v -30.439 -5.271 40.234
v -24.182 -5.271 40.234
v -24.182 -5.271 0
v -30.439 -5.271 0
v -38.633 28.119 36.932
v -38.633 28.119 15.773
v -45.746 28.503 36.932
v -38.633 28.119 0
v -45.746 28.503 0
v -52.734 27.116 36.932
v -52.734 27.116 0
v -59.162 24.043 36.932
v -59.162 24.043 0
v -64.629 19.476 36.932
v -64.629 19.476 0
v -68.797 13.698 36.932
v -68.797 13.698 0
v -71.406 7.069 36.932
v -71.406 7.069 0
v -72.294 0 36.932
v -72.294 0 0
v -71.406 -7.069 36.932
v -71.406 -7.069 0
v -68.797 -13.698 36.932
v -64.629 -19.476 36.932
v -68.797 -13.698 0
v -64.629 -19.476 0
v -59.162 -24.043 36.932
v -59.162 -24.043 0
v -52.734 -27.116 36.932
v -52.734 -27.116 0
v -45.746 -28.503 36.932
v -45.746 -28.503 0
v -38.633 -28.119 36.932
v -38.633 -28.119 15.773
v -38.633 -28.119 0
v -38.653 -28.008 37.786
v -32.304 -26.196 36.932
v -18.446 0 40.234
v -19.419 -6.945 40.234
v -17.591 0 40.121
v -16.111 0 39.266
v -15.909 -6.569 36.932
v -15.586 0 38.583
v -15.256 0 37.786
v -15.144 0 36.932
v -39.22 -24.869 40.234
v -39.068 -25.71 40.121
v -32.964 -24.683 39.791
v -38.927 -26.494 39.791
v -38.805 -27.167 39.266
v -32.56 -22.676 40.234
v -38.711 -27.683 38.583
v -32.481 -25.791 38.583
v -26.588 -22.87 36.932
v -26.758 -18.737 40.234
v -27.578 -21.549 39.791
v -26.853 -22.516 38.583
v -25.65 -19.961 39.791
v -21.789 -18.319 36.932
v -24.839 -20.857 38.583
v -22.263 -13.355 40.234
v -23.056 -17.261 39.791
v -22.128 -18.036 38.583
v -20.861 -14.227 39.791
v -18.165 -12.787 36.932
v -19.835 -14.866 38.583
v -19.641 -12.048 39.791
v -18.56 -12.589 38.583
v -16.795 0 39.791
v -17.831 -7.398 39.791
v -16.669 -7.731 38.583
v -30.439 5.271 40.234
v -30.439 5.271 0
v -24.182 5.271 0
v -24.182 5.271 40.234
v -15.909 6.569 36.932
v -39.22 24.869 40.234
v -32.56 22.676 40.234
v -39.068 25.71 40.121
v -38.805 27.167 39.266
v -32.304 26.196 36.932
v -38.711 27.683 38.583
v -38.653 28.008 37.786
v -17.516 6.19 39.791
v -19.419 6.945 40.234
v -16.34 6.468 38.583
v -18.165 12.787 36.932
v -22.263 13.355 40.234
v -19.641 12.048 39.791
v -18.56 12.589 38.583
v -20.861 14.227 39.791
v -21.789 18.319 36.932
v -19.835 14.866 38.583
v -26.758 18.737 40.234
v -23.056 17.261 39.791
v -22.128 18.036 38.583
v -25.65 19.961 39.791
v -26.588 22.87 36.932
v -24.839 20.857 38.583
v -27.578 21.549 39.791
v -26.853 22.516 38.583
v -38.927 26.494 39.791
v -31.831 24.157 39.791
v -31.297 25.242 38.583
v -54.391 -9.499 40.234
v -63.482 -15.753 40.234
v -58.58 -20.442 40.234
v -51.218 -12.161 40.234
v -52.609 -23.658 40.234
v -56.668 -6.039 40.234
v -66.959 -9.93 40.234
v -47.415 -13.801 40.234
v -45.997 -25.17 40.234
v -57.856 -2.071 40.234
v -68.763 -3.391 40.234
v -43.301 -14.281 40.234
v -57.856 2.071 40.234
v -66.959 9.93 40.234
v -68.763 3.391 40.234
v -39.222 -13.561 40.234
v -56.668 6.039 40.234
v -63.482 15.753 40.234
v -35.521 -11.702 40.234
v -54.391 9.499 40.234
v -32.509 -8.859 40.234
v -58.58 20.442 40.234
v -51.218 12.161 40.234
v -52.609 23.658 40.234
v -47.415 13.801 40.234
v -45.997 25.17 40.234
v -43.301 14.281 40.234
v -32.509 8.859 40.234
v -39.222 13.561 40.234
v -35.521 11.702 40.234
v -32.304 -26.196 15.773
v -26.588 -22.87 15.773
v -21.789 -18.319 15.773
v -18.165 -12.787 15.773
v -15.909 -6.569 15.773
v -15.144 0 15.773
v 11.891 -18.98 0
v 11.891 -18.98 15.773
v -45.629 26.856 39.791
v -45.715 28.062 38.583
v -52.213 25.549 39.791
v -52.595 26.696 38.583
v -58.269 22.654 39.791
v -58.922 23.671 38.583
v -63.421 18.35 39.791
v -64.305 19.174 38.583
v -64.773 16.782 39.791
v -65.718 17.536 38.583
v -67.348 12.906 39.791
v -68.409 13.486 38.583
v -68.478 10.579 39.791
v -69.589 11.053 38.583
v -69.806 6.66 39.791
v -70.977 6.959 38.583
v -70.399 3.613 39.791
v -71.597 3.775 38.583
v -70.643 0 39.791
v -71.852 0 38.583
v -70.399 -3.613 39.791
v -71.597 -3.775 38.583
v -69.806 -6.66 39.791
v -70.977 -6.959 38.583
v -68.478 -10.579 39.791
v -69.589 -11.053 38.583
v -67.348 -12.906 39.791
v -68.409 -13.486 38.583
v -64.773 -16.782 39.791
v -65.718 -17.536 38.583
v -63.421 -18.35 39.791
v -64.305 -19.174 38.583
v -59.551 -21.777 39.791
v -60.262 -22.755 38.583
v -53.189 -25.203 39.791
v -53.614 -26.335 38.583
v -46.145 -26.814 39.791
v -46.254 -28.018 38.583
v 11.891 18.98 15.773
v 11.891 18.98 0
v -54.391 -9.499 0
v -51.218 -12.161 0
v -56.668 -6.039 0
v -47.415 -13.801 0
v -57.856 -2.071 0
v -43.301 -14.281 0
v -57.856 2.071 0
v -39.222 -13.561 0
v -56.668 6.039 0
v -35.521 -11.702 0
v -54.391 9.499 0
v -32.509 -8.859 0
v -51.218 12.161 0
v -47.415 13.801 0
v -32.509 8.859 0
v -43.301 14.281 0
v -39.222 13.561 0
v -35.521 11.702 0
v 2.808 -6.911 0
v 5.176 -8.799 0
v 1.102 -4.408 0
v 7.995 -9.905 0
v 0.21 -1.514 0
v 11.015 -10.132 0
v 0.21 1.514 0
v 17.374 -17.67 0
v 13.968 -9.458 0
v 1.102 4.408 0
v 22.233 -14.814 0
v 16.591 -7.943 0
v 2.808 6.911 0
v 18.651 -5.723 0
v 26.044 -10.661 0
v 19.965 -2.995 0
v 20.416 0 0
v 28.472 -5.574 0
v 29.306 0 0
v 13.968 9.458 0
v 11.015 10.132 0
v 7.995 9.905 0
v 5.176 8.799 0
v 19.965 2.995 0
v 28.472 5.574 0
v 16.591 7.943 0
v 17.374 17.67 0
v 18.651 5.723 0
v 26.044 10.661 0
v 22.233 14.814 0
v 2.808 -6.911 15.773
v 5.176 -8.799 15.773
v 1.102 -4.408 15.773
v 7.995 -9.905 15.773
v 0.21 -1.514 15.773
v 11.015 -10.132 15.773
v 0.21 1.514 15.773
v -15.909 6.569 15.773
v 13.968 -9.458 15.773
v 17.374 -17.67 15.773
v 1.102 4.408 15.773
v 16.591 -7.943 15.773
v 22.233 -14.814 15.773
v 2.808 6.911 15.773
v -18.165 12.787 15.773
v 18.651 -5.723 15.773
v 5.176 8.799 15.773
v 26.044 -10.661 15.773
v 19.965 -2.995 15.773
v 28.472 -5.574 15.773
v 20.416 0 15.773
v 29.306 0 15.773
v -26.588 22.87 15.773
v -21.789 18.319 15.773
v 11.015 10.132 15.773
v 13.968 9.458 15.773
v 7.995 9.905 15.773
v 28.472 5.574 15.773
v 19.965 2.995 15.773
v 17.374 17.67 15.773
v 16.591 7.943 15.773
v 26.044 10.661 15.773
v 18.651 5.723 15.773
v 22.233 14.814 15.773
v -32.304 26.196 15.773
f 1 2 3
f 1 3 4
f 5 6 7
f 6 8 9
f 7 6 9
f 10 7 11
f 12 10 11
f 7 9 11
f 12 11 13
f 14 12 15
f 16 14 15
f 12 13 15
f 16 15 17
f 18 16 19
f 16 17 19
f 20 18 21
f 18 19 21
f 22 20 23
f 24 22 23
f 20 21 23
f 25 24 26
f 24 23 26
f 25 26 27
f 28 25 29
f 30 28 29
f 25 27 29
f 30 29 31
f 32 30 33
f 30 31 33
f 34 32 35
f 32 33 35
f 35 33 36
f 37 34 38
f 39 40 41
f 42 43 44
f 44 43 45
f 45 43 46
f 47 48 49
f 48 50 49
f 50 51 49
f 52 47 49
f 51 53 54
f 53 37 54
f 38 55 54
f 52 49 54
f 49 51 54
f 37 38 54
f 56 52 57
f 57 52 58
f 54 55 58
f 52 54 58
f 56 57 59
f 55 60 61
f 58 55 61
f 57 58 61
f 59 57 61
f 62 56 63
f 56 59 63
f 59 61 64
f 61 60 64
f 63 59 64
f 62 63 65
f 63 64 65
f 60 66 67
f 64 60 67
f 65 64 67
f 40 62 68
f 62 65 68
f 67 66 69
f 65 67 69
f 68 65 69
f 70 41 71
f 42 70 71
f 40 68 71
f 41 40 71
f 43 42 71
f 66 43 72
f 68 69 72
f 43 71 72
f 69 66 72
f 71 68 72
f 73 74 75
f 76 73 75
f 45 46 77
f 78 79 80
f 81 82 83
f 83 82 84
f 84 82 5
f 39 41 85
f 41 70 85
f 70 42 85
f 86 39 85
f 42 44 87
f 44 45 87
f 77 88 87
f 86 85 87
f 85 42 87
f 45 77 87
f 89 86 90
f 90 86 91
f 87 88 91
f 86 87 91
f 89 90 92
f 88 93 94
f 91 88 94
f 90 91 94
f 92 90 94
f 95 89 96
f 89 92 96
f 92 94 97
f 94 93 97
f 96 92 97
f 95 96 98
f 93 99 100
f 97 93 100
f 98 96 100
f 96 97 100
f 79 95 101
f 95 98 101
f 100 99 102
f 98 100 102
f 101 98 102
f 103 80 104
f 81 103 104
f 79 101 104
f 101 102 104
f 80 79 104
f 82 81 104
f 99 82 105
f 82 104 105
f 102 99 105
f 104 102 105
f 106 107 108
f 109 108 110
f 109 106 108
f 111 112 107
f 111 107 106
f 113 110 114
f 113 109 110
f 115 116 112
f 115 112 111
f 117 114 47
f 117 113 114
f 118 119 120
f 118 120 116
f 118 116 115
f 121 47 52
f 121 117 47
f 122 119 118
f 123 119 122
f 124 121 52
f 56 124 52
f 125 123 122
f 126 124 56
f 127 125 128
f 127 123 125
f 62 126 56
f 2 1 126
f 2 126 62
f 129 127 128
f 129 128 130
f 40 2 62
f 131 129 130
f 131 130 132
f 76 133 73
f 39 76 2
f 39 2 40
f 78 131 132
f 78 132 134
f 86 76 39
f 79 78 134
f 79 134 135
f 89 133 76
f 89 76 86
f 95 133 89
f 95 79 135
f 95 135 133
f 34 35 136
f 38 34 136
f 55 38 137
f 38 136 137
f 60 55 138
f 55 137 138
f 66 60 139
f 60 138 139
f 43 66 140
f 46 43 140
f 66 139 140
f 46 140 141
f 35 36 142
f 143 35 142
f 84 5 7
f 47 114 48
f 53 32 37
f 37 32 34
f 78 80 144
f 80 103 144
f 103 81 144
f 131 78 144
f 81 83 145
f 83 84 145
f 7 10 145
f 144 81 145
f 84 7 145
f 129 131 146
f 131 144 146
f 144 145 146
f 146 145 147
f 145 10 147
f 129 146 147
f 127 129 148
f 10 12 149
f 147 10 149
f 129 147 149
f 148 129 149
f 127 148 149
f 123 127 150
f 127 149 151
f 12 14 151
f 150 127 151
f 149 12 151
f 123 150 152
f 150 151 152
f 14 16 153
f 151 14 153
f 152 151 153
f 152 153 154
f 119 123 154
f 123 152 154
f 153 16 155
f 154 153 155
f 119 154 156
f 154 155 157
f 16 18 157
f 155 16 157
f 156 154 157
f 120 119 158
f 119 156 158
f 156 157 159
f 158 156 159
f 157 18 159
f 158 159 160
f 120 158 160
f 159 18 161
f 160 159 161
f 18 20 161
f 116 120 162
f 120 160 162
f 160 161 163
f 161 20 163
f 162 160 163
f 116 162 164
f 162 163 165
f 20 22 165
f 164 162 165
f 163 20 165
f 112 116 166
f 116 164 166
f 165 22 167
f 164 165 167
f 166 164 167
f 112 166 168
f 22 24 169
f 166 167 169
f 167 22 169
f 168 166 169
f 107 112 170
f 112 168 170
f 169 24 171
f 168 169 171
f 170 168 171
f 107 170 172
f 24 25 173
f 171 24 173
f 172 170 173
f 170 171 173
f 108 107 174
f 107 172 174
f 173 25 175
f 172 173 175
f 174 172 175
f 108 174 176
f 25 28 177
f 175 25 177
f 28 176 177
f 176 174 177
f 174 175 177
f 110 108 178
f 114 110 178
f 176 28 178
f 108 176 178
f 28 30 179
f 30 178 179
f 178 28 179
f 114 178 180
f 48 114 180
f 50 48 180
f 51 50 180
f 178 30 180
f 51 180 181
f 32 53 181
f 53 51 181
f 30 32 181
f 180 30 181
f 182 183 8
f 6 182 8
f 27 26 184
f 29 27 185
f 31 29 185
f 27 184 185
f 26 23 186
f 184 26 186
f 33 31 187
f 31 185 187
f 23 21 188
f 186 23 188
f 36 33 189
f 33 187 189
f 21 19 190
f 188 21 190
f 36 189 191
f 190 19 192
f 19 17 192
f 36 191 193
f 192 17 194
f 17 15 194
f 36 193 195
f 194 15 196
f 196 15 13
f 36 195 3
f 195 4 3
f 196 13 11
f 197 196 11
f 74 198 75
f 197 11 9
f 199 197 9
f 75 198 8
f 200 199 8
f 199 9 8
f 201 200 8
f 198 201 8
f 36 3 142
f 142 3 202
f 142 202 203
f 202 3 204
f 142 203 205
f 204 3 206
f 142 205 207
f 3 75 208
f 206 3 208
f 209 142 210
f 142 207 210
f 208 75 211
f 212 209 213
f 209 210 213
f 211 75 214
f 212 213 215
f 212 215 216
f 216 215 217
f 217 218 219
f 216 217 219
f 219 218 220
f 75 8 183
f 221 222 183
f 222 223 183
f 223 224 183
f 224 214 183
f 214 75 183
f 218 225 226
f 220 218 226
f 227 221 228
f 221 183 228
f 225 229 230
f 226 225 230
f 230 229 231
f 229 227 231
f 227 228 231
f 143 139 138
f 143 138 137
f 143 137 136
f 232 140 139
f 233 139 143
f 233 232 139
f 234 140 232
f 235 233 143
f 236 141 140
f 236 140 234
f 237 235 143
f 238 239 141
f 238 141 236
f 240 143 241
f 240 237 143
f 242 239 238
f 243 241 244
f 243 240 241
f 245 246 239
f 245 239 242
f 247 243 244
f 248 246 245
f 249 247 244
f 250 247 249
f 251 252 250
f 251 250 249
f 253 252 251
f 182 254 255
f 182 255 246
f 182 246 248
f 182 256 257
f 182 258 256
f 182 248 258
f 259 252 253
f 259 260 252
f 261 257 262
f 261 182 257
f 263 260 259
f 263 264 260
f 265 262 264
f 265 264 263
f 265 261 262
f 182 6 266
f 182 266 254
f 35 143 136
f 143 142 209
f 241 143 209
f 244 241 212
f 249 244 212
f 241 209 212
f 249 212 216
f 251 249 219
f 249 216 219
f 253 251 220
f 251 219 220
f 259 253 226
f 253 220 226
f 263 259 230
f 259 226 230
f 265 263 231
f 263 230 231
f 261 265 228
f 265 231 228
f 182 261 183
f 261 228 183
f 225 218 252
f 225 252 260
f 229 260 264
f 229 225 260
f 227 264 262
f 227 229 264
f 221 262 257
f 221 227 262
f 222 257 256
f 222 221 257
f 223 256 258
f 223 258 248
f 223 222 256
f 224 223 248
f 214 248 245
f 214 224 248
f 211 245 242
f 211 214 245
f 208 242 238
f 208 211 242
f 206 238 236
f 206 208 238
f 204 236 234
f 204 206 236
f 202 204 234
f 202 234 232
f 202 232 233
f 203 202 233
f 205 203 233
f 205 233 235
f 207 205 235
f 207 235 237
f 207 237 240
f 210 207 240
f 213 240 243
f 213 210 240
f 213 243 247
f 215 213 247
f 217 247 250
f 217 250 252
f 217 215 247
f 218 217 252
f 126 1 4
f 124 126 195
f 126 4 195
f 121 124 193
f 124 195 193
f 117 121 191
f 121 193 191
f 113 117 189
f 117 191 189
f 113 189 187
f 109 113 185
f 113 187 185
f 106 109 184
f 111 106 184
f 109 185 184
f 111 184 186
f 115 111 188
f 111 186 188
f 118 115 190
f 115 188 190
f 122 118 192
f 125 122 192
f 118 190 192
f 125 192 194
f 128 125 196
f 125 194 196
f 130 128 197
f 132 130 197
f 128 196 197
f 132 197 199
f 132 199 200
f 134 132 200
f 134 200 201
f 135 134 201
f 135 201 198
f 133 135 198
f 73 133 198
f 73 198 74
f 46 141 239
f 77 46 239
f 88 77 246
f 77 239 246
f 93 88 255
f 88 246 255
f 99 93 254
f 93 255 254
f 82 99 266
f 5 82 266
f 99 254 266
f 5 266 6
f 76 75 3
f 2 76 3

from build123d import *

# Parameters (mm, degrees)
F1_DEPTH = 40.2336
F0_R     = 10.16
F2_DEPTH = 15.7734
F3_R     = 3.302


with BuildPart() as f1:
    # F0 (on Top) → F1 (new body)
    with BuildSketch(Plane.XY):
        with BuildLine():
            ThreePointArc((-38.632684, -28.118692), (-21.788691, -18.319272), (-15.143919, 0))
            ThreePointArc((-15.143919, 0), (-21.788691, 18.319272), (-38.632684, 28.118692))
            ThreePointArc((-38.632684, 28.118692), (-72.293919, 0), (-38.632684, -28.118692))
        make_face()
        with BuildLine():
            ThreePointArc((-30.439394, -5.271326), (-58.006419, 0), (-30.439394, 5.271326))
            Line((-30.439394, 5.271326), (-24.181643, 5.271326))
            Line((-24.181643, 5.271326), (-24.181643, -5.271326))
            Line((-24.181643, -5.271326), (-30.439394, -5.271326))
        make_face(mode=Mode.SUBTRACT)
    extrude(amount=F1_DEPTH)

    # F0 (on Top) → F2 (join)
    with BuildSketch(Plane.XY):
        with BuildLine():
            ThreePointArc((-38.632684, -28.118692), (-21.788691, -18.319272), (-15.143919, 0))
            ThreePointArc((-15.143919, 0), (-21.788691, 18.319272), (-38.632684, 28.118692))
            ThreePointArc((-38.632684, 28.118692), (-72.293919, 0), (-38.632684, -28.118692))
        make_face()
        with BuildLine():
            ThreePointArc((-30.439394, -5.271326), (-58.006419, 0), (-30.439394, 5.271326))
            Line((-30.439394, 5.271326), (-24.181643, 5.271326))
            Line((-24.181643, 5.271326), (-24.181643, -5.271326))
            Line((-24.181643, -5.271326), (-30.439394, -5.271326))
        make_face(mode=Mode.SUBTRACT)
        with BuildLine():
            ThreePointArc((-38.632684, 28.118692), (-21.788691, 18.319272), (-15.143919, 0))
            ThreePointArc((-15.143919, 0), (-21.788691, -18.319272), (-38.632684, -28.118692))
            Line((-38.632684, -28.118692), (11.891298, -18.979688))
            ThreePointArc((11.891298, -18.979688), (29.306081, 0), (11.891298, 18.979688))
            Line((11.891298, 18.979688), (-38.632684, 28.118692))
        make_face()
        with Locations((10.256081, 0)):
            Circle(F0_R, mode=Mode.SUBTRACT)
    extrude(amount=F2_DEPTH)

    # F3
    f3_edges = [f1.edges().sort_by_distance(p)[0] for p in [
        (-48.805153, 28.118692, 40.2336),
    ]]
    fillet(f3_edges, radius=F3_R)


solid = f1.part
